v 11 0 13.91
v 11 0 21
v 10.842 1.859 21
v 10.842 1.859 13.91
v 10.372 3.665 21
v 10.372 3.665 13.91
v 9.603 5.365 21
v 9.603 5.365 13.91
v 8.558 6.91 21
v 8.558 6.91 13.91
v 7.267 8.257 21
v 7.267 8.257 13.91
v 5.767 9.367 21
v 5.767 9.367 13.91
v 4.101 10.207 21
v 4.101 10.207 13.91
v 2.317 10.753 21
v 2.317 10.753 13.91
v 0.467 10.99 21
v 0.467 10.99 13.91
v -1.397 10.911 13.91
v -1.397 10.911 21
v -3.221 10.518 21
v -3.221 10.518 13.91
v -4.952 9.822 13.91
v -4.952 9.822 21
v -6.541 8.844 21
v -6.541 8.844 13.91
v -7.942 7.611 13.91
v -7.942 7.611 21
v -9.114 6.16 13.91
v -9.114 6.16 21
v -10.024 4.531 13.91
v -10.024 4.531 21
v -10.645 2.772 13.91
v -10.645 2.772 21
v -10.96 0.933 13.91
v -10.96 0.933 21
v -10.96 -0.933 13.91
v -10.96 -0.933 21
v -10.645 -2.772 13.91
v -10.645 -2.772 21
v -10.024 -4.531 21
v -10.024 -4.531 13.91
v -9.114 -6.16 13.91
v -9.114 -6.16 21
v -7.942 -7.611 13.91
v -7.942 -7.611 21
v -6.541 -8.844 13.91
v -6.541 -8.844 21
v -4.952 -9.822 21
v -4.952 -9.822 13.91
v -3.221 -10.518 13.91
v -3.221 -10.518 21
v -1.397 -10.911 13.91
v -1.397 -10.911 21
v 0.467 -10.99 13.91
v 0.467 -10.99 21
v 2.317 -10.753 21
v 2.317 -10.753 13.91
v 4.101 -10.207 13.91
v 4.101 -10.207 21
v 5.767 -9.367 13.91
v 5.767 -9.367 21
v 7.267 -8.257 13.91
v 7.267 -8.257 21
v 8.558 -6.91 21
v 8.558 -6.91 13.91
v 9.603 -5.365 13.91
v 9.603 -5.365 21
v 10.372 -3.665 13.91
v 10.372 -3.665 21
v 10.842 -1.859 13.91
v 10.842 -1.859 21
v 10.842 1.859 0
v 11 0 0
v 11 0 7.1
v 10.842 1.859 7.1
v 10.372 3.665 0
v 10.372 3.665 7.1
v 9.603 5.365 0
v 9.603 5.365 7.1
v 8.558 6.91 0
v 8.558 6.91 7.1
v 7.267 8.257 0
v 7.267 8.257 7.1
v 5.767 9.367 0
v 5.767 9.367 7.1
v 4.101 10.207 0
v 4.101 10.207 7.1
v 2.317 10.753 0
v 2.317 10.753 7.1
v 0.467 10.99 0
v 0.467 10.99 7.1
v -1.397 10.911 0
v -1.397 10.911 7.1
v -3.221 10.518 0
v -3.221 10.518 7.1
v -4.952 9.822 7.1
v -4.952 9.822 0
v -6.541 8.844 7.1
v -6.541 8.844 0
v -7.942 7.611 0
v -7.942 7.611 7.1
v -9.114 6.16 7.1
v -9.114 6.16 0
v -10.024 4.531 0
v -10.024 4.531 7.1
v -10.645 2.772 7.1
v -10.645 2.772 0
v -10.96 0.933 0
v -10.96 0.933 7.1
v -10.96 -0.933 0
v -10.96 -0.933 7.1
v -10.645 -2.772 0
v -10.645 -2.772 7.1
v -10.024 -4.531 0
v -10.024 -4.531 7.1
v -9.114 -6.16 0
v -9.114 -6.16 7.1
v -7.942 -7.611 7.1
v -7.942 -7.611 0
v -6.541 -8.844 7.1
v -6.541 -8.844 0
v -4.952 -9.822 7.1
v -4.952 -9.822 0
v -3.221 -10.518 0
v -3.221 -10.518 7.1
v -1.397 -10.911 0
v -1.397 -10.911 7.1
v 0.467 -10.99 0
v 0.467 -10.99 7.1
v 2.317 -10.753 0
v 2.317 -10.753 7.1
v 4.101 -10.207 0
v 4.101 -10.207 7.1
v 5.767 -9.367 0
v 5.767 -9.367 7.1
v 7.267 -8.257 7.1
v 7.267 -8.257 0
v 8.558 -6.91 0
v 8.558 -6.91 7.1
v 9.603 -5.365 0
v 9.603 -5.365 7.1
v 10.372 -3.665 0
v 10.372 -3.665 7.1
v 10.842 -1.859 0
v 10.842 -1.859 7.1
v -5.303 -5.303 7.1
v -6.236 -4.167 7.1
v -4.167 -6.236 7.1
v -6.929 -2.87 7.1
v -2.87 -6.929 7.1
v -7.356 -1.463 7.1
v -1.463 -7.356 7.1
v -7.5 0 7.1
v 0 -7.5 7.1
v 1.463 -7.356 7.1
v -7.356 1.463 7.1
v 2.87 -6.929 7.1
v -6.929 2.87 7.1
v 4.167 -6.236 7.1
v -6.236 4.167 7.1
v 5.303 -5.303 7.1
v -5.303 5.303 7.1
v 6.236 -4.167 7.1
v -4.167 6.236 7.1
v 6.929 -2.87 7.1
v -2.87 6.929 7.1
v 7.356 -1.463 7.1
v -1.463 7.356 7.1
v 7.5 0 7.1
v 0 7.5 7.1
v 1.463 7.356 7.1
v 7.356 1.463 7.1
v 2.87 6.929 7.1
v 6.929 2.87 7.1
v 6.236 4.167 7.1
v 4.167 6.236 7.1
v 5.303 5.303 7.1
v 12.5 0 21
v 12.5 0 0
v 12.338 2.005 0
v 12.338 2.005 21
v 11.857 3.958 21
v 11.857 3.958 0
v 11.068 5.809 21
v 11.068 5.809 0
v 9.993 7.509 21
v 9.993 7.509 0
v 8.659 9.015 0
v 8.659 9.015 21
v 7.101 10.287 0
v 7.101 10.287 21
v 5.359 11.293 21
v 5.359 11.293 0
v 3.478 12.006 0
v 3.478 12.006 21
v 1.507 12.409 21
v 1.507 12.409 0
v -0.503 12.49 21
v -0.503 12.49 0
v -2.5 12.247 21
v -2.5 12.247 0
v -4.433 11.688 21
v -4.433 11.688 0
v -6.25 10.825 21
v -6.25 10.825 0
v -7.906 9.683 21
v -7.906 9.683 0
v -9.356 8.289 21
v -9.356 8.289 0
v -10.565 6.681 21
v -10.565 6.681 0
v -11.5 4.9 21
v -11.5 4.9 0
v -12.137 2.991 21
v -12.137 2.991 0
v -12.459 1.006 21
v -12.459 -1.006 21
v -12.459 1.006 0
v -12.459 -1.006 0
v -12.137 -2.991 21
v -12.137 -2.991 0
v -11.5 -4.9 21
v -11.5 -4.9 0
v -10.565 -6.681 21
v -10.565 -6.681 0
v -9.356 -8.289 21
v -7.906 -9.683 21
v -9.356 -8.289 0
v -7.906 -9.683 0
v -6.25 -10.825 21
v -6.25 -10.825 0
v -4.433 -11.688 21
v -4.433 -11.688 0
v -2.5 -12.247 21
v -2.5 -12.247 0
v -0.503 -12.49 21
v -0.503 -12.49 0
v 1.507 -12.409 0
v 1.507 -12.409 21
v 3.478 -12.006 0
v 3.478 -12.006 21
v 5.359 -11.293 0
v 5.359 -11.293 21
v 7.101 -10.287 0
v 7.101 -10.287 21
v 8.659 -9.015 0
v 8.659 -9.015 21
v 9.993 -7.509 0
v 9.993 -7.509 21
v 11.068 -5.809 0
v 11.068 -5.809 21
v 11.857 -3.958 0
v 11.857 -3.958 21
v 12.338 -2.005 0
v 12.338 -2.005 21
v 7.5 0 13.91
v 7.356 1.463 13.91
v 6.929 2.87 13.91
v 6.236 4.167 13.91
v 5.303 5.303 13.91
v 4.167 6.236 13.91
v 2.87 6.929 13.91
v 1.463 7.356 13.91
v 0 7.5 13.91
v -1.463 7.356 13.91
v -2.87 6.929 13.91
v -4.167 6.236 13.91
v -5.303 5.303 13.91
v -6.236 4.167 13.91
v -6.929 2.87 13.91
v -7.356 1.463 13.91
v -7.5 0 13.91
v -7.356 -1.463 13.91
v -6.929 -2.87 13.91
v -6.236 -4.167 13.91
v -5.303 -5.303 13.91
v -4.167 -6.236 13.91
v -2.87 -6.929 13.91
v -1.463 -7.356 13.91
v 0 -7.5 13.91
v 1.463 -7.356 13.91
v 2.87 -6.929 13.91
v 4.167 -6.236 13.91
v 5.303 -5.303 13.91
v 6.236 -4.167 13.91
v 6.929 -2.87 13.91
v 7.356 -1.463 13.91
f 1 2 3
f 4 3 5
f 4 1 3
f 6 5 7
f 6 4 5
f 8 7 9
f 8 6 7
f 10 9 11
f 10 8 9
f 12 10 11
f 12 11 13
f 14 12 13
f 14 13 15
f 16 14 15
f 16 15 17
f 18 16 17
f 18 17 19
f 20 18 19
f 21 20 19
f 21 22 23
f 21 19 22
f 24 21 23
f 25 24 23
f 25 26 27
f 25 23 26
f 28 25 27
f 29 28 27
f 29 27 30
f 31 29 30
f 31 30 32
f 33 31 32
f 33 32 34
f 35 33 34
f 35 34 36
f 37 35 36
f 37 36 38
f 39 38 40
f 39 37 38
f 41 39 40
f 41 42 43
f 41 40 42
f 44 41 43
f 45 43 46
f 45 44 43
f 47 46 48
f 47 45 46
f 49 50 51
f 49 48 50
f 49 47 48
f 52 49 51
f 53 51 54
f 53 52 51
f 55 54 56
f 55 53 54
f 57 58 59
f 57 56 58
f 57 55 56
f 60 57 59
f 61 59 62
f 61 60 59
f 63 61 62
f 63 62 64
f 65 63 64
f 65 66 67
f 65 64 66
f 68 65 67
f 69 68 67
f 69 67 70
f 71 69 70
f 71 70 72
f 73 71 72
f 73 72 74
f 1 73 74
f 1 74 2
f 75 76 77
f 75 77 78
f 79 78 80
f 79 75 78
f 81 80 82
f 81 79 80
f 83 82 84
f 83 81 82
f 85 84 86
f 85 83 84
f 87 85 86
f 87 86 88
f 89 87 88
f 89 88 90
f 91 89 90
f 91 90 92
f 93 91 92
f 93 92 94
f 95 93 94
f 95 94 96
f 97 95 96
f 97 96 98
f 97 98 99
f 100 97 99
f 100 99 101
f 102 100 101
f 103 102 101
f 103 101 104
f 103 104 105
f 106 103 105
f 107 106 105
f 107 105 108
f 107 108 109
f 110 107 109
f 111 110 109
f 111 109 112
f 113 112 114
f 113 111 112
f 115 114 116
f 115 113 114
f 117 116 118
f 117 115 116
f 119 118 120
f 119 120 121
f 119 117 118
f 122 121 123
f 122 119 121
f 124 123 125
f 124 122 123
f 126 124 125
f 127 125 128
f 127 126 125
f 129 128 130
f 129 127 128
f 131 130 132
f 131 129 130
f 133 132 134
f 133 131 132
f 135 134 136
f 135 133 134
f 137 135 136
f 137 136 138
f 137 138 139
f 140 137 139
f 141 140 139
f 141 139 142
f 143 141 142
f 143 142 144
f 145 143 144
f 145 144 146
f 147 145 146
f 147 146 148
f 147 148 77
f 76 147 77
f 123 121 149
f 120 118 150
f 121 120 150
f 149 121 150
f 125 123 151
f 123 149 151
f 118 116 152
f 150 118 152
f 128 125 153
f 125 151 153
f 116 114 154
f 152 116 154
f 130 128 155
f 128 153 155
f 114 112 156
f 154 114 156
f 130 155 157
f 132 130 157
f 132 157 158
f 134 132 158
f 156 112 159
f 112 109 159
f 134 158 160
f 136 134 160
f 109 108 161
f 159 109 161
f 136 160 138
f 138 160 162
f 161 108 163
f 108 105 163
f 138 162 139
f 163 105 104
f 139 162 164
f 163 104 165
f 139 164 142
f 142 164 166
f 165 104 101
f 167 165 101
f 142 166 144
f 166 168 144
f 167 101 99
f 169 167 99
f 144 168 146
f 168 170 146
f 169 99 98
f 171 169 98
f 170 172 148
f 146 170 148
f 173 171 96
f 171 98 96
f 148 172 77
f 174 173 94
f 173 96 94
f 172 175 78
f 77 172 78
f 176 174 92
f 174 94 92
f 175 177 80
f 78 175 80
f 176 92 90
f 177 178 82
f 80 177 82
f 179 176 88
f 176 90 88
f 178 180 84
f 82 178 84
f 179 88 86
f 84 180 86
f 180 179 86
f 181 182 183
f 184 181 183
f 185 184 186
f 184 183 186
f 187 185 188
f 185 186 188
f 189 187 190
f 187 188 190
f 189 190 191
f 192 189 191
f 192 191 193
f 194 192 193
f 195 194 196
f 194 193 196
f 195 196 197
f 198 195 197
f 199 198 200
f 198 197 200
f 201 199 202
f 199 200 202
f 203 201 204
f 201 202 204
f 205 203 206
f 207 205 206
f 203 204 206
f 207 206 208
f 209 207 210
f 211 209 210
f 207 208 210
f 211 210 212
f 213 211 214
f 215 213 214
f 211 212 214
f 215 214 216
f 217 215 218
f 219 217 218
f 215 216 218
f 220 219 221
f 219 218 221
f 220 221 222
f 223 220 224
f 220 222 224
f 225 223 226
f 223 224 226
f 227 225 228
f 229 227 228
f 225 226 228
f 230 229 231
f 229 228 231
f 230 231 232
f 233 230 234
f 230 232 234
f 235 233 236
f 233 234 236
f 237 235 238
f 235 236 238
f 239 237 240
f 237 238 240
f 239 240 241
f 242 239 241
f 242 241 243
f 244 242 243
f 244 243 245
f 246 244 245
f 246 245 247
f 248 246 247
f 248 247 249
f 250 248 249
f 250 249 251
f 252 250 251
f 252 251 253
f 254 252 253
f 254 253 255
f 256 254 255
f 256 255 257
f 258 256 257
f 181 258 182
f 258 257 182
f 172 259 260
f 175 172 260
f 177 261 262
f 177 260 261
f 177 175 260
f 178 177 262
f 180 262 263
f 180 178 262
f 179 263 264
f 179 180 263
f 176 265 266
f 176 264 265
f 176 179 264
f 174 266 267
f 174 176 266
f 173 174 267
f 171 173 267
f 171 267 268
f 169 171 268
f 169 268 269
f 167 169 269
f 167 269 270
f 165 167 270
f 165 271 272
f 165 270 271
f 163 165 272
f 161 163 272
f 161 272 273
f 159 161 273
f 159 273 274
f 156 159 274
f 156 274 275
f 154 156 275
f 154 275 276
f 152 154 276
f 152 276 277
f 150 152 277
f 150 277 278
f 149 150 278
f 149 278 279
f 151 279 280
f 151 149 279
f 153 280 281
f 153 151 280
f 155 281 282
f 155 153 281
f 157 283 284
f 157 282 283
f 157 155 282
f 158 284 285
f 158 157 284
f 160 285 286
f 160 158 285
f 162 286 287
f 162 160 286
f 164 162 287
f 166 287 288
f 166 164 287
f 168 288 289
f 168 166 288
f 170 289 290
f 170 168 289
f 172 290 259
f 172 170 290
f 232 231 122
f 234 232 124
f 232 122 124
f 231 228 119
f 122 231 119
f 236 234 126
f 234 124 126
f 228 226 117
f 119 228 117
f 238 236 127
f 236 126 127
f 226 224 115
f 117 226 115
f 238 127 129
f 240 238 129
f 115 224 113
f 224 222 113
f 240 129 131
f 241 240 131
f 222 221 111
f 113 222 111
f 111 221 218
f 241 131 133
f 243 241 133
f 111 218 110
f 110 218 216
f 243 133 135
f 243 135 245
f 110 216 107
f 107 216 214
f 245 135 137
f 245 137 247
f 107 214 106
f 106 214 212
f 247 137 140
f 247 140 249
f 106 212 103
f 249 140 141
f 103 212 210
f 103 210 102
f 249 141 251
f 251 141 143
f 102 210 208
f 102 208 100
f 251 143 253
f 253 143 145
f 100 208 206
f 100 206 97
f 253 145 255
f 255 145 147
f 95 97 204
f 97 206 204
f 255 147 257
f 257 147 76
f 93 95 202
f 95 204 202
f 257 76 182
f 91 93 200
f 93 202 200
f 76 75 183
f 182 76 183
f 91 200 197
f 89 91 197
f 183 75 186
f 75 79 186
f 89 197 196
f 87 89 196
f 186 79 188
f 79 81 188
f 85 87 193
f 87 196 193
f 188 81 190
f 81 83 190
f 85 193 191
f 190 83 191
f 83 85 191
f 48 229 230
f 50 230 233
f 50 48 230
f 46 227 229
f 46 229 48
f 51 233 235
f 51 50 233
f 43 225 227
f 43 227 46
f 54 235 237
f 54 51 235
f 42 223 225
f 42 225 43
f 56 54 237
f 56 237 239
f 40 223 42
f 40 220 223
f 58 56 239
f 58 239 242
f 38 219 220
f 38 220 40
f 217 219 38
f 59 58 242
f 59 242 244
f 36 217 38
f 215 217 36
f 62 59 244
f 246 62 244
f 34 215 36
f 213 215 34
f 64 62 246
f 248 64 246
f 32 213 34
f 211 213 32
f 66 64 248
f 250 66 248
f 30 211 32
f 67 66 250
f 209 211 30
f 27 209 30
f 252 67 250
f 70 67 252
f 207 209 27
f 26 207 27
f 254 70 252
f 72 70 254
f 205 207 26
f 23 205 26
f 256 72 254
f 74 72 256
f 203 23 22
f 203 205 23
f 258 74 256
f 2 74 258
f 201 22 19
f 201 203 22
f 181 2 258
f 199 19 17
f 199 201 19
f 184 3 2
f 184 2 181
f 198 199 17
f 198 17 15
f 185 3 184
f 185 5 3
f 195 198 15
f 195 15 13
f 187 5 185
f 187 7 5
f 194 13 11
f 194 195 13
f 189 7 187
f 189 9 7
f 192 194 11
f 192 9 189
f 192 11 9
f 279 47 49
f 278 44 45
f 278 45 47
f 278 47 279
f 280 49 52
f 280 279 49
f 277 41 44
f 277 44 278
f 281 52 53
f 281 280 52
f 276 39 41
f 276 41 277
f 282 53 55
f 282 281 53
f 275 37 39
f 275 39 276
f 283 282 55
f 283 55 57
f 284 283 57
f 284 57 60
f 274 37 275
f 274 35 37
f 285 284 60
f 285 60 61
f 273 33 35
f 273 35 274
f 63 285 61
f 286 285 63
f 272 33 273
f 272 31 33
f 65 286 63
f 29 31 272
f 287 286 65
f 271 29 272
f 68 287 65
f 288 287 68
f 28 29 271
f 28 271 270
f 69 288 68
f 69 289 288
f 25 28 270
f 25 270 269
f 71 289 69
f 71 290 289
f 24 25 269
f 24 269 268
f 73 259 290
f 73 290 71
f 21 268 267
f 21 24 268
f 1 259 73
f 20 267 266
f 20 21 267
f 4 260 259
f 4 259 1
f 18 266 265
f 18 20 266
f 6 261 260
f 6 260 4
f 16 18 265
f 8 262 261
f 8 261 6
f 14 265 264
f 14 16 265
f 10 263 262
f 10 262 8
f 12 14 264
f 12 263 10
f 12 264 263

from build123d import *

# Parameters (mm, degrees)
CYLINDER003_R     = 11
CYLINDER003_DEPTH = 7.1
CYLINDER002_R     = 11
CYLINDER002_DEPTH = 7.1
CYLINDER001_R     = 7.5
CYLINDER001_DEPTH = 50
CYLINDER_R        = 12.5
CYLINDER_DEPTH    = 21


with BuildPart() as cylindre003:
    # Cylinder003 → Cylinder003 (new body)
    with BuildSketch(Plane.XY.offset(13.91)):
        Circle(CYLINDER003_R)
    extrude(amount=CYLINDER003_DEPTH)


with BuildPart() as cylindre002:
    # Cylinder002 → Cylinder002 (new body)
    with BuildSketch(Plane.XY.offset(-0.0001)):
        Circle(CYLINDER002_R)
    extrude(amount=CYLINDER002_DEPTH)


with BuildPart() as cylindre001:
    # Cylinder001 → Cylinder001 (new body)
    with BuildSketch(Plane.XY.offset(-11)):
        Circle(CYLINDER001_R)
    extrude(amount=CYLINDER001_DEPTH)


with BuildPart() as cut002:
    # Cylinder → Cylinder (new body)
    with BuildSketch(Plane.XY):
        Circle(CYLINDER_R)
    extrude(amount=CYLINDER_DEPTH)

    # Cut: cut Cylindre001
    add(cylindre001.part, mode=Mode.SUBTRACT)

    # Cut001: cut Cylindre002
    add(cylindre002.part, mode=Mode.SUBTRACT)

    # Cut002: cut Cylindre003
    add(cylindre003.part, mode=Mode.SUBTRACT)


solid = cut002.part
